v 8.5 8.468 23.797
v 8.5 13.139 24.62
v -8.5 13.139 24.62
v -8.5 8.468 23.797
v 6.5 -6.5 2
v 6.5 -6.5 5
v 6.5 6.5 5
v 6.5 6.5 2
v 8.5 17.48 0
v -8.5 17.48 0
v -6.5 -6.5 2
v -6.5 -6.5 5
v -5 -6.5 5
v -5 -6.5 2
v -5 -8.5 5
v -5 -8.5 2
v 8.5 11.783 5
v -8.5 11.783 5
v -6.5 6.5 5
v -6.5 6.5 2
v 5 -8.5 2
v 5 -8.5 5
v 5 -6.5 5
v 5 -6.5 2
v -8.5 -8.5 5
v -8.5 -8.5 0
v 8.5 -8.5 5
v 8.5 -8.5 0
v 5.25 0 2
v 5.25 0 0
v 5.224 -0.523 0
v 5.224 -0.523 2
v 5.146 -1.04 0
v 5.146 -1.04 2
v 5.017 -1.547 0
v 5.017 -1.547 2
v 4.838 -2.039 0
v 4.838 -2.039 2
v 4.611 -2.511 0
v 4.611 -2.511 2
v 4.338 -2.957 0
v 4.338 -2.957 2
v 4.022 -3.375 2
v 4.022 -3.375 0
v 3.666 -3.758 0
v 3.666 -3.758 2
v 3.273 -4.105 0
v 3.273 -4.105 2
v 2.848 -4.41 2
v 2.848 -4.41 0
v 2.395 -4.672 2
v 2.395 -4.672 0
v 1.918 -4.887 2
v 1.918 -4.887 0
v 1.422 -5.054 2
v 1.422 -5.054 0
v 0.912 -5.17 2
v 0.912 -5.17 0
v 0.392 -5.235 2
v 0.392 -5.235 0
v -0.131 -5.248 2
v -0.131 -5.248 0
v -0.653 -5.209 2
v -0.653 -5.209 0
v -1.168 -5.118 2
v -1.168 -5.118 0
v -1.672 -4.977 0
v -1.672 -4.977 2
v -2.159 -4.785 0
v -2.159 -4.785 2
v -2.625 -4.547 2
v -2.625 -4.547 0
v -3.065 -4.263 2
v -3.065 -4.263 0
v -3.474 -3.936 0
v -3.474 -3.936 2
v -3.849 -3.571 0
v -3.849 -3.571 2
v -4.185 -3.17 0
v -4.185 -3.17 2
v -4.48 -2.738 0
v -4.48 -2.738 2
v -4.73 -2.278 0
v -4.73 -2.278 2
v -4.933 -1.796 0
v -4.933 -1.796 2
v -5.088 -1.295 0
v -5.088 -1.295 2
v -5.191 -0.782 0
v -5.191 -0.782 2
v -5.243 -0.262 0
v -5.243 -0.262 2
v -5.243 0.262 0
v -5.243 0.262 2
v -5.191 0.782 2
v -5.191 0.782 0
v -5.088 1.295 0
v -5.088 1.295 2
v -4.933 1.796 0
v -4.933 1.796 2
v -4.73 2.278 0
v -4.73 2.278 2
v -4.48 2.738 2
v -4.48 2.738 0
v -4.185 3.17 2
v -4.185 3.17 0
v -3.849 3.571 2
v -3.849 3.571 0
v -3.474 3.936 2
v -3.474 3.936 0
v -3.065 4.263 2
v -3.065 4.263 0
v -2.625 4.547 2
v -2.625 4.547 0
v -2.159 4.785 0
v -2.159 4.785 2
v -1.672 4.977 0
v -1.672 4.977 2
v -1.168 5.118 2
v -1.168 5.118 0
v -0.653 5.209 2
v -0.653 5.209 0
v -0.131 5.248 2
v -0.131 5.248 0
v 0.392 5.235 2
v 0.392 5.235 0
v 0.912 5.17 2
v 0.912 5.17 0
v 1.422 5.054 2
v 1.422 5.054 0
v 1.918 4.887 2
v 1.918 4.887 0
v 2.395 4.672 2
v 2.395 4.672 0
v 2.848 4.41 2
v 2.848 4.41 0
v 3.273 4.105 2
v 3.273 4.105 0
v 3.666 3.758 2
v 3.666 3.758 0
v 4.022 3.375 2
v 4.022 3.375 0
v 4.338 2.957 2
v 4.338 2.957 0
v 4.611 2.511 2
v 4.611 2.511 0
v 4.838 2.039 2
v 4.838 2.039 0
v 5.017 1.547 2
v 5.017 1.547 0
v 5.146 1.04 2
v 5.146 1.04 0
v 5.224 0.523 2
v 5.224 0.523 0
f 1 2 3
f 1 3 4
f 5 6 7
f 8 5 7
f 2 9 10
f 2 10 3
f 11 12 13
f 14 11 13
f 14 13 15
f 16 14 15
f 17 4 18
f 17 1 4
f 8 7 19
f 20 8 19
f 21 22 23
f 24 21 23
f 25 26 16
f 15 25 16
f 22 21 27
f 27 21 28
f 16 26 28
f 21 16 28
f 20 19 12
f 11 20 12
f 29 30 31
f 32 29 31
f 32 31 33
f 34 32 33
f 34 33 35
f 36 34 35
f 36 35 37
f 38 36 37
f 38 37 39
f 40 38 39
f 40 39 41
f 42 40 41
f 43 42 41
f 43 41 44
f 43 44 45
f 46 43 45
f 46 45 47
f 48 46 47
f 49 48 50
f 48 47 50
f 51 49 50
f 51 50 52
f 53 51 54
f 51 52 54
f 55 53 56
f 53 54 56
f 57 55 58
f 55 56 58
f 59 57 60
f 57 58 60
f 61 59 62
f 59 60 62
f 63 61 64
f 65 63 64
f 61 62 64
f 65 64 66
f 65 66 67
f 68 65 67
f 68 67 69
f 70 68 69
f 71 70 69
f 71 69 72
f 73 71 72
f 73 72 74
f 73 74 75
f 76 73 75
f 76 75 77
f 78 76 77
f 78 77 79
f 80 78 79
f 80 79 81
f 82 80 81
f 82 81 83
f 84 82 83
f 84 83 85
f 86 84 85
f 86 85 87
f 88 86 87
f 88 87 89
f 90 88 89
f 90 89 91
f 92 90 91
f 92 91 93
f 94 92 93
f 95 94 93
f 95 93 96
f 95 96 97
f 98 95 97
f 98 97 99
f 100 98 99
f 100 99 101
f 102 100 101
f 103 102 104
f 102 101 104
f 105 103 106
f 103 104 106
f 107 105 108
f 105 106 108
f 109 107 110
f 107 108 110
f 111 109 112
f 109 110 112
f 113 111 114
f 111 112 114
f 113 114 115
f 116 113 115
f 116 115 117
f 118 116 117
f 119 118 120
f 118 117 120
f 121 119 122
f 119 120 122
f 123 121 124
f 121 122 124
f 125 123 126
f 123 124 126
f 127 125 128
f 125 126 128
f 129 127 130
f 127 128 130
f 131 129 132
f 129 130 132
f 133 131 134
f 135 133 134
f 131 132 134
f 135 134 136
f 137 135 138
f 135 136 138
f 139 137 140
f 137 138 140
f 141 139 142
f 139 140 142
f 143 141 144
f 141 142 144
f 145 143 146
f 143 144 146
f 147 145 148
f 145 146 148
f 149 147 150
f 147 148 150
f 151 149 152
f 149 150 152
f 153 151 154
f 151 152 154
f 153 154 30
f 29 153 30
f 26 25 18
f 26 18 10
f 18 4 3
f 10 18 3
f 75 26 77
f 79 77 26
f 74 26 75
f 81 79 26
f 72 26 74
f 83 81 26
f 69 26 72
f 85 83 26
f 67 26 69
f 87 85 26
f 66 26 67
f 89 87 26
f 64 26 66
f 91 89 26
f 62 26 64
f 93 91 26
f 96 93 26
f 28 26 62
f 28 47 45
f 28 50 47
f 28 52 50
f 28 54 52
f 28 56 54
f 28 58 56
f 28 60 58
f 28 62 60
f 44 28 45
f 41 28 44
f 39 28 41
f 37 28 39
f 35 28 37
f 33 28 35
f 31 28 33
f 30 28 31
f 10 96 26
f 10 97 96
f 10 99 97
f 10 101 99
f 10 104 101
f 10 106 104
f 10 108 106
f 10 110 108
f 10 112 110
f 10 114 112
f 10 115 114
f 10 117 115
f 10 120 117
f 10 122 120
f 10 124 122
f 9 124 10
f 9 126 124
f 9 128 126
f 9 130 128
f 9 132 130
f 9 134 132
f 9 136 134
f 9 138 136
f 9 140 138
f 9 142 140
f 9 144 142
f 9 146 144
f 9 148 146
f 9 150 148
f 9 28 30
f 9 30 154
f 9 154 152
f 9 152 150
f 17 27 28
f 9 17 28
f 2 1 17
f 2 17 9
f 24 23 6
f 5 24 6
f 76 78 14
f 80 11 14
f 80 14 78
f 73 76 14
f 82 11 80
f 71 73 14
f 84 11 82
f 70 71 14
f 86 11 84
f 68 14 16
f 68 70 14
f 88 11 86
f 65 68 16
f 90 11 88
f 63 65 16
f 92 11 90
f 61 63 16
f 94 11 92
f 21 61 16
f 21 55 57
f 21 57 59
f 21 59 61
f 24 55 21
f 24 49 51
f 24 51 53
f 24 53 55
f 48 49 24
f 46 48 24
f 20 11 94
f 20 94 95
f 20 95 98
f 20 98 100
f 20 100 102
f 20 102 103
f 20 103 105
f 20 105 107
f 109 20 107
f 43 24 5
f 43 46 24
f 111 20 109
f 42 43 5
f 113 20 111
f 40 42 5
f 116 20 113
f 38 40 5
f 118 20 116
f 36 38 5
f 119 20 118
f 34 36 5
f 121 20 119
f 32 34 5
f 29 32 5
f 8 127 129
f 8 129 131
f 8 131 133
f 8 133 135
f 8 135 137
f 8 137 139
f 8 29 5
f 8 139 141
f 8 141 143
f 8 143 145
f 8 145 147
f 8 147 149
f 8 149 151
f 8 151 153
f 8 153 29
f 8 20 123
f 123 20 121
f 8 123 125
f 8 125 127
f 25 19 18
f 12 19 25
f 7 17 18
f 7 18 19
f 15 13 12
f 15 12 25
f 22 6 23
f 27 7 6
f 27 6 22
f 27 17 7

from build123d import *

# Parameters (mm, degrees)
F0_W     = 17
F0_H     = 17
F1_DEPTH = 5
F3_DEPTH = 3
F4_R     = 5.25
F5_DEPTH = 25
F7_DEPTH = 8.5


with BuildPart() as f1:
    # F0 (on Top) → F1 (new body)
    with BuildSketch(Plane.XY):
        Rectangle(F0_W, F0_H)
    extrude(amount=F1_DEPTH)

    # F2 (on face) → F3 (cut)
    with BuildSketch(Plane.XY.offset(5)):
        Polygon((6.5, 6.5), (-6.5, 6.5), (-6.5, -6.5), (-5, -6.5), (-5, -8.5), (5, -8.5), (5, -6.5), (6.5, -6.5), align=None)
    extrude(amount=-F3_DEPTH, mode=Mode.SUBTRACT)

    # F4 (on face) → F5 (cut)
    with BuildSketch(Plane(origin=(0, 0, 0), x_dir=(1, 0, 0), z_dir=(0, 0, -1))):
        Circle(F4_R)
    extrude(amount=-F5_DEPTH, mode=Mode.SUBTRACT)

    # F6 (on Right) → F7 (join, symmetric)
    with BuildSketch(Plane.YZ):
        Polygon((8.5, 5), (8.5, 0), (17.480478, 0), (13.139273, 24.620194), (8.46825, 23.796566), (11.782592, 5), align=None)
    extrude(amount=F7_DEPTH, both=True)


solid = f1.part
